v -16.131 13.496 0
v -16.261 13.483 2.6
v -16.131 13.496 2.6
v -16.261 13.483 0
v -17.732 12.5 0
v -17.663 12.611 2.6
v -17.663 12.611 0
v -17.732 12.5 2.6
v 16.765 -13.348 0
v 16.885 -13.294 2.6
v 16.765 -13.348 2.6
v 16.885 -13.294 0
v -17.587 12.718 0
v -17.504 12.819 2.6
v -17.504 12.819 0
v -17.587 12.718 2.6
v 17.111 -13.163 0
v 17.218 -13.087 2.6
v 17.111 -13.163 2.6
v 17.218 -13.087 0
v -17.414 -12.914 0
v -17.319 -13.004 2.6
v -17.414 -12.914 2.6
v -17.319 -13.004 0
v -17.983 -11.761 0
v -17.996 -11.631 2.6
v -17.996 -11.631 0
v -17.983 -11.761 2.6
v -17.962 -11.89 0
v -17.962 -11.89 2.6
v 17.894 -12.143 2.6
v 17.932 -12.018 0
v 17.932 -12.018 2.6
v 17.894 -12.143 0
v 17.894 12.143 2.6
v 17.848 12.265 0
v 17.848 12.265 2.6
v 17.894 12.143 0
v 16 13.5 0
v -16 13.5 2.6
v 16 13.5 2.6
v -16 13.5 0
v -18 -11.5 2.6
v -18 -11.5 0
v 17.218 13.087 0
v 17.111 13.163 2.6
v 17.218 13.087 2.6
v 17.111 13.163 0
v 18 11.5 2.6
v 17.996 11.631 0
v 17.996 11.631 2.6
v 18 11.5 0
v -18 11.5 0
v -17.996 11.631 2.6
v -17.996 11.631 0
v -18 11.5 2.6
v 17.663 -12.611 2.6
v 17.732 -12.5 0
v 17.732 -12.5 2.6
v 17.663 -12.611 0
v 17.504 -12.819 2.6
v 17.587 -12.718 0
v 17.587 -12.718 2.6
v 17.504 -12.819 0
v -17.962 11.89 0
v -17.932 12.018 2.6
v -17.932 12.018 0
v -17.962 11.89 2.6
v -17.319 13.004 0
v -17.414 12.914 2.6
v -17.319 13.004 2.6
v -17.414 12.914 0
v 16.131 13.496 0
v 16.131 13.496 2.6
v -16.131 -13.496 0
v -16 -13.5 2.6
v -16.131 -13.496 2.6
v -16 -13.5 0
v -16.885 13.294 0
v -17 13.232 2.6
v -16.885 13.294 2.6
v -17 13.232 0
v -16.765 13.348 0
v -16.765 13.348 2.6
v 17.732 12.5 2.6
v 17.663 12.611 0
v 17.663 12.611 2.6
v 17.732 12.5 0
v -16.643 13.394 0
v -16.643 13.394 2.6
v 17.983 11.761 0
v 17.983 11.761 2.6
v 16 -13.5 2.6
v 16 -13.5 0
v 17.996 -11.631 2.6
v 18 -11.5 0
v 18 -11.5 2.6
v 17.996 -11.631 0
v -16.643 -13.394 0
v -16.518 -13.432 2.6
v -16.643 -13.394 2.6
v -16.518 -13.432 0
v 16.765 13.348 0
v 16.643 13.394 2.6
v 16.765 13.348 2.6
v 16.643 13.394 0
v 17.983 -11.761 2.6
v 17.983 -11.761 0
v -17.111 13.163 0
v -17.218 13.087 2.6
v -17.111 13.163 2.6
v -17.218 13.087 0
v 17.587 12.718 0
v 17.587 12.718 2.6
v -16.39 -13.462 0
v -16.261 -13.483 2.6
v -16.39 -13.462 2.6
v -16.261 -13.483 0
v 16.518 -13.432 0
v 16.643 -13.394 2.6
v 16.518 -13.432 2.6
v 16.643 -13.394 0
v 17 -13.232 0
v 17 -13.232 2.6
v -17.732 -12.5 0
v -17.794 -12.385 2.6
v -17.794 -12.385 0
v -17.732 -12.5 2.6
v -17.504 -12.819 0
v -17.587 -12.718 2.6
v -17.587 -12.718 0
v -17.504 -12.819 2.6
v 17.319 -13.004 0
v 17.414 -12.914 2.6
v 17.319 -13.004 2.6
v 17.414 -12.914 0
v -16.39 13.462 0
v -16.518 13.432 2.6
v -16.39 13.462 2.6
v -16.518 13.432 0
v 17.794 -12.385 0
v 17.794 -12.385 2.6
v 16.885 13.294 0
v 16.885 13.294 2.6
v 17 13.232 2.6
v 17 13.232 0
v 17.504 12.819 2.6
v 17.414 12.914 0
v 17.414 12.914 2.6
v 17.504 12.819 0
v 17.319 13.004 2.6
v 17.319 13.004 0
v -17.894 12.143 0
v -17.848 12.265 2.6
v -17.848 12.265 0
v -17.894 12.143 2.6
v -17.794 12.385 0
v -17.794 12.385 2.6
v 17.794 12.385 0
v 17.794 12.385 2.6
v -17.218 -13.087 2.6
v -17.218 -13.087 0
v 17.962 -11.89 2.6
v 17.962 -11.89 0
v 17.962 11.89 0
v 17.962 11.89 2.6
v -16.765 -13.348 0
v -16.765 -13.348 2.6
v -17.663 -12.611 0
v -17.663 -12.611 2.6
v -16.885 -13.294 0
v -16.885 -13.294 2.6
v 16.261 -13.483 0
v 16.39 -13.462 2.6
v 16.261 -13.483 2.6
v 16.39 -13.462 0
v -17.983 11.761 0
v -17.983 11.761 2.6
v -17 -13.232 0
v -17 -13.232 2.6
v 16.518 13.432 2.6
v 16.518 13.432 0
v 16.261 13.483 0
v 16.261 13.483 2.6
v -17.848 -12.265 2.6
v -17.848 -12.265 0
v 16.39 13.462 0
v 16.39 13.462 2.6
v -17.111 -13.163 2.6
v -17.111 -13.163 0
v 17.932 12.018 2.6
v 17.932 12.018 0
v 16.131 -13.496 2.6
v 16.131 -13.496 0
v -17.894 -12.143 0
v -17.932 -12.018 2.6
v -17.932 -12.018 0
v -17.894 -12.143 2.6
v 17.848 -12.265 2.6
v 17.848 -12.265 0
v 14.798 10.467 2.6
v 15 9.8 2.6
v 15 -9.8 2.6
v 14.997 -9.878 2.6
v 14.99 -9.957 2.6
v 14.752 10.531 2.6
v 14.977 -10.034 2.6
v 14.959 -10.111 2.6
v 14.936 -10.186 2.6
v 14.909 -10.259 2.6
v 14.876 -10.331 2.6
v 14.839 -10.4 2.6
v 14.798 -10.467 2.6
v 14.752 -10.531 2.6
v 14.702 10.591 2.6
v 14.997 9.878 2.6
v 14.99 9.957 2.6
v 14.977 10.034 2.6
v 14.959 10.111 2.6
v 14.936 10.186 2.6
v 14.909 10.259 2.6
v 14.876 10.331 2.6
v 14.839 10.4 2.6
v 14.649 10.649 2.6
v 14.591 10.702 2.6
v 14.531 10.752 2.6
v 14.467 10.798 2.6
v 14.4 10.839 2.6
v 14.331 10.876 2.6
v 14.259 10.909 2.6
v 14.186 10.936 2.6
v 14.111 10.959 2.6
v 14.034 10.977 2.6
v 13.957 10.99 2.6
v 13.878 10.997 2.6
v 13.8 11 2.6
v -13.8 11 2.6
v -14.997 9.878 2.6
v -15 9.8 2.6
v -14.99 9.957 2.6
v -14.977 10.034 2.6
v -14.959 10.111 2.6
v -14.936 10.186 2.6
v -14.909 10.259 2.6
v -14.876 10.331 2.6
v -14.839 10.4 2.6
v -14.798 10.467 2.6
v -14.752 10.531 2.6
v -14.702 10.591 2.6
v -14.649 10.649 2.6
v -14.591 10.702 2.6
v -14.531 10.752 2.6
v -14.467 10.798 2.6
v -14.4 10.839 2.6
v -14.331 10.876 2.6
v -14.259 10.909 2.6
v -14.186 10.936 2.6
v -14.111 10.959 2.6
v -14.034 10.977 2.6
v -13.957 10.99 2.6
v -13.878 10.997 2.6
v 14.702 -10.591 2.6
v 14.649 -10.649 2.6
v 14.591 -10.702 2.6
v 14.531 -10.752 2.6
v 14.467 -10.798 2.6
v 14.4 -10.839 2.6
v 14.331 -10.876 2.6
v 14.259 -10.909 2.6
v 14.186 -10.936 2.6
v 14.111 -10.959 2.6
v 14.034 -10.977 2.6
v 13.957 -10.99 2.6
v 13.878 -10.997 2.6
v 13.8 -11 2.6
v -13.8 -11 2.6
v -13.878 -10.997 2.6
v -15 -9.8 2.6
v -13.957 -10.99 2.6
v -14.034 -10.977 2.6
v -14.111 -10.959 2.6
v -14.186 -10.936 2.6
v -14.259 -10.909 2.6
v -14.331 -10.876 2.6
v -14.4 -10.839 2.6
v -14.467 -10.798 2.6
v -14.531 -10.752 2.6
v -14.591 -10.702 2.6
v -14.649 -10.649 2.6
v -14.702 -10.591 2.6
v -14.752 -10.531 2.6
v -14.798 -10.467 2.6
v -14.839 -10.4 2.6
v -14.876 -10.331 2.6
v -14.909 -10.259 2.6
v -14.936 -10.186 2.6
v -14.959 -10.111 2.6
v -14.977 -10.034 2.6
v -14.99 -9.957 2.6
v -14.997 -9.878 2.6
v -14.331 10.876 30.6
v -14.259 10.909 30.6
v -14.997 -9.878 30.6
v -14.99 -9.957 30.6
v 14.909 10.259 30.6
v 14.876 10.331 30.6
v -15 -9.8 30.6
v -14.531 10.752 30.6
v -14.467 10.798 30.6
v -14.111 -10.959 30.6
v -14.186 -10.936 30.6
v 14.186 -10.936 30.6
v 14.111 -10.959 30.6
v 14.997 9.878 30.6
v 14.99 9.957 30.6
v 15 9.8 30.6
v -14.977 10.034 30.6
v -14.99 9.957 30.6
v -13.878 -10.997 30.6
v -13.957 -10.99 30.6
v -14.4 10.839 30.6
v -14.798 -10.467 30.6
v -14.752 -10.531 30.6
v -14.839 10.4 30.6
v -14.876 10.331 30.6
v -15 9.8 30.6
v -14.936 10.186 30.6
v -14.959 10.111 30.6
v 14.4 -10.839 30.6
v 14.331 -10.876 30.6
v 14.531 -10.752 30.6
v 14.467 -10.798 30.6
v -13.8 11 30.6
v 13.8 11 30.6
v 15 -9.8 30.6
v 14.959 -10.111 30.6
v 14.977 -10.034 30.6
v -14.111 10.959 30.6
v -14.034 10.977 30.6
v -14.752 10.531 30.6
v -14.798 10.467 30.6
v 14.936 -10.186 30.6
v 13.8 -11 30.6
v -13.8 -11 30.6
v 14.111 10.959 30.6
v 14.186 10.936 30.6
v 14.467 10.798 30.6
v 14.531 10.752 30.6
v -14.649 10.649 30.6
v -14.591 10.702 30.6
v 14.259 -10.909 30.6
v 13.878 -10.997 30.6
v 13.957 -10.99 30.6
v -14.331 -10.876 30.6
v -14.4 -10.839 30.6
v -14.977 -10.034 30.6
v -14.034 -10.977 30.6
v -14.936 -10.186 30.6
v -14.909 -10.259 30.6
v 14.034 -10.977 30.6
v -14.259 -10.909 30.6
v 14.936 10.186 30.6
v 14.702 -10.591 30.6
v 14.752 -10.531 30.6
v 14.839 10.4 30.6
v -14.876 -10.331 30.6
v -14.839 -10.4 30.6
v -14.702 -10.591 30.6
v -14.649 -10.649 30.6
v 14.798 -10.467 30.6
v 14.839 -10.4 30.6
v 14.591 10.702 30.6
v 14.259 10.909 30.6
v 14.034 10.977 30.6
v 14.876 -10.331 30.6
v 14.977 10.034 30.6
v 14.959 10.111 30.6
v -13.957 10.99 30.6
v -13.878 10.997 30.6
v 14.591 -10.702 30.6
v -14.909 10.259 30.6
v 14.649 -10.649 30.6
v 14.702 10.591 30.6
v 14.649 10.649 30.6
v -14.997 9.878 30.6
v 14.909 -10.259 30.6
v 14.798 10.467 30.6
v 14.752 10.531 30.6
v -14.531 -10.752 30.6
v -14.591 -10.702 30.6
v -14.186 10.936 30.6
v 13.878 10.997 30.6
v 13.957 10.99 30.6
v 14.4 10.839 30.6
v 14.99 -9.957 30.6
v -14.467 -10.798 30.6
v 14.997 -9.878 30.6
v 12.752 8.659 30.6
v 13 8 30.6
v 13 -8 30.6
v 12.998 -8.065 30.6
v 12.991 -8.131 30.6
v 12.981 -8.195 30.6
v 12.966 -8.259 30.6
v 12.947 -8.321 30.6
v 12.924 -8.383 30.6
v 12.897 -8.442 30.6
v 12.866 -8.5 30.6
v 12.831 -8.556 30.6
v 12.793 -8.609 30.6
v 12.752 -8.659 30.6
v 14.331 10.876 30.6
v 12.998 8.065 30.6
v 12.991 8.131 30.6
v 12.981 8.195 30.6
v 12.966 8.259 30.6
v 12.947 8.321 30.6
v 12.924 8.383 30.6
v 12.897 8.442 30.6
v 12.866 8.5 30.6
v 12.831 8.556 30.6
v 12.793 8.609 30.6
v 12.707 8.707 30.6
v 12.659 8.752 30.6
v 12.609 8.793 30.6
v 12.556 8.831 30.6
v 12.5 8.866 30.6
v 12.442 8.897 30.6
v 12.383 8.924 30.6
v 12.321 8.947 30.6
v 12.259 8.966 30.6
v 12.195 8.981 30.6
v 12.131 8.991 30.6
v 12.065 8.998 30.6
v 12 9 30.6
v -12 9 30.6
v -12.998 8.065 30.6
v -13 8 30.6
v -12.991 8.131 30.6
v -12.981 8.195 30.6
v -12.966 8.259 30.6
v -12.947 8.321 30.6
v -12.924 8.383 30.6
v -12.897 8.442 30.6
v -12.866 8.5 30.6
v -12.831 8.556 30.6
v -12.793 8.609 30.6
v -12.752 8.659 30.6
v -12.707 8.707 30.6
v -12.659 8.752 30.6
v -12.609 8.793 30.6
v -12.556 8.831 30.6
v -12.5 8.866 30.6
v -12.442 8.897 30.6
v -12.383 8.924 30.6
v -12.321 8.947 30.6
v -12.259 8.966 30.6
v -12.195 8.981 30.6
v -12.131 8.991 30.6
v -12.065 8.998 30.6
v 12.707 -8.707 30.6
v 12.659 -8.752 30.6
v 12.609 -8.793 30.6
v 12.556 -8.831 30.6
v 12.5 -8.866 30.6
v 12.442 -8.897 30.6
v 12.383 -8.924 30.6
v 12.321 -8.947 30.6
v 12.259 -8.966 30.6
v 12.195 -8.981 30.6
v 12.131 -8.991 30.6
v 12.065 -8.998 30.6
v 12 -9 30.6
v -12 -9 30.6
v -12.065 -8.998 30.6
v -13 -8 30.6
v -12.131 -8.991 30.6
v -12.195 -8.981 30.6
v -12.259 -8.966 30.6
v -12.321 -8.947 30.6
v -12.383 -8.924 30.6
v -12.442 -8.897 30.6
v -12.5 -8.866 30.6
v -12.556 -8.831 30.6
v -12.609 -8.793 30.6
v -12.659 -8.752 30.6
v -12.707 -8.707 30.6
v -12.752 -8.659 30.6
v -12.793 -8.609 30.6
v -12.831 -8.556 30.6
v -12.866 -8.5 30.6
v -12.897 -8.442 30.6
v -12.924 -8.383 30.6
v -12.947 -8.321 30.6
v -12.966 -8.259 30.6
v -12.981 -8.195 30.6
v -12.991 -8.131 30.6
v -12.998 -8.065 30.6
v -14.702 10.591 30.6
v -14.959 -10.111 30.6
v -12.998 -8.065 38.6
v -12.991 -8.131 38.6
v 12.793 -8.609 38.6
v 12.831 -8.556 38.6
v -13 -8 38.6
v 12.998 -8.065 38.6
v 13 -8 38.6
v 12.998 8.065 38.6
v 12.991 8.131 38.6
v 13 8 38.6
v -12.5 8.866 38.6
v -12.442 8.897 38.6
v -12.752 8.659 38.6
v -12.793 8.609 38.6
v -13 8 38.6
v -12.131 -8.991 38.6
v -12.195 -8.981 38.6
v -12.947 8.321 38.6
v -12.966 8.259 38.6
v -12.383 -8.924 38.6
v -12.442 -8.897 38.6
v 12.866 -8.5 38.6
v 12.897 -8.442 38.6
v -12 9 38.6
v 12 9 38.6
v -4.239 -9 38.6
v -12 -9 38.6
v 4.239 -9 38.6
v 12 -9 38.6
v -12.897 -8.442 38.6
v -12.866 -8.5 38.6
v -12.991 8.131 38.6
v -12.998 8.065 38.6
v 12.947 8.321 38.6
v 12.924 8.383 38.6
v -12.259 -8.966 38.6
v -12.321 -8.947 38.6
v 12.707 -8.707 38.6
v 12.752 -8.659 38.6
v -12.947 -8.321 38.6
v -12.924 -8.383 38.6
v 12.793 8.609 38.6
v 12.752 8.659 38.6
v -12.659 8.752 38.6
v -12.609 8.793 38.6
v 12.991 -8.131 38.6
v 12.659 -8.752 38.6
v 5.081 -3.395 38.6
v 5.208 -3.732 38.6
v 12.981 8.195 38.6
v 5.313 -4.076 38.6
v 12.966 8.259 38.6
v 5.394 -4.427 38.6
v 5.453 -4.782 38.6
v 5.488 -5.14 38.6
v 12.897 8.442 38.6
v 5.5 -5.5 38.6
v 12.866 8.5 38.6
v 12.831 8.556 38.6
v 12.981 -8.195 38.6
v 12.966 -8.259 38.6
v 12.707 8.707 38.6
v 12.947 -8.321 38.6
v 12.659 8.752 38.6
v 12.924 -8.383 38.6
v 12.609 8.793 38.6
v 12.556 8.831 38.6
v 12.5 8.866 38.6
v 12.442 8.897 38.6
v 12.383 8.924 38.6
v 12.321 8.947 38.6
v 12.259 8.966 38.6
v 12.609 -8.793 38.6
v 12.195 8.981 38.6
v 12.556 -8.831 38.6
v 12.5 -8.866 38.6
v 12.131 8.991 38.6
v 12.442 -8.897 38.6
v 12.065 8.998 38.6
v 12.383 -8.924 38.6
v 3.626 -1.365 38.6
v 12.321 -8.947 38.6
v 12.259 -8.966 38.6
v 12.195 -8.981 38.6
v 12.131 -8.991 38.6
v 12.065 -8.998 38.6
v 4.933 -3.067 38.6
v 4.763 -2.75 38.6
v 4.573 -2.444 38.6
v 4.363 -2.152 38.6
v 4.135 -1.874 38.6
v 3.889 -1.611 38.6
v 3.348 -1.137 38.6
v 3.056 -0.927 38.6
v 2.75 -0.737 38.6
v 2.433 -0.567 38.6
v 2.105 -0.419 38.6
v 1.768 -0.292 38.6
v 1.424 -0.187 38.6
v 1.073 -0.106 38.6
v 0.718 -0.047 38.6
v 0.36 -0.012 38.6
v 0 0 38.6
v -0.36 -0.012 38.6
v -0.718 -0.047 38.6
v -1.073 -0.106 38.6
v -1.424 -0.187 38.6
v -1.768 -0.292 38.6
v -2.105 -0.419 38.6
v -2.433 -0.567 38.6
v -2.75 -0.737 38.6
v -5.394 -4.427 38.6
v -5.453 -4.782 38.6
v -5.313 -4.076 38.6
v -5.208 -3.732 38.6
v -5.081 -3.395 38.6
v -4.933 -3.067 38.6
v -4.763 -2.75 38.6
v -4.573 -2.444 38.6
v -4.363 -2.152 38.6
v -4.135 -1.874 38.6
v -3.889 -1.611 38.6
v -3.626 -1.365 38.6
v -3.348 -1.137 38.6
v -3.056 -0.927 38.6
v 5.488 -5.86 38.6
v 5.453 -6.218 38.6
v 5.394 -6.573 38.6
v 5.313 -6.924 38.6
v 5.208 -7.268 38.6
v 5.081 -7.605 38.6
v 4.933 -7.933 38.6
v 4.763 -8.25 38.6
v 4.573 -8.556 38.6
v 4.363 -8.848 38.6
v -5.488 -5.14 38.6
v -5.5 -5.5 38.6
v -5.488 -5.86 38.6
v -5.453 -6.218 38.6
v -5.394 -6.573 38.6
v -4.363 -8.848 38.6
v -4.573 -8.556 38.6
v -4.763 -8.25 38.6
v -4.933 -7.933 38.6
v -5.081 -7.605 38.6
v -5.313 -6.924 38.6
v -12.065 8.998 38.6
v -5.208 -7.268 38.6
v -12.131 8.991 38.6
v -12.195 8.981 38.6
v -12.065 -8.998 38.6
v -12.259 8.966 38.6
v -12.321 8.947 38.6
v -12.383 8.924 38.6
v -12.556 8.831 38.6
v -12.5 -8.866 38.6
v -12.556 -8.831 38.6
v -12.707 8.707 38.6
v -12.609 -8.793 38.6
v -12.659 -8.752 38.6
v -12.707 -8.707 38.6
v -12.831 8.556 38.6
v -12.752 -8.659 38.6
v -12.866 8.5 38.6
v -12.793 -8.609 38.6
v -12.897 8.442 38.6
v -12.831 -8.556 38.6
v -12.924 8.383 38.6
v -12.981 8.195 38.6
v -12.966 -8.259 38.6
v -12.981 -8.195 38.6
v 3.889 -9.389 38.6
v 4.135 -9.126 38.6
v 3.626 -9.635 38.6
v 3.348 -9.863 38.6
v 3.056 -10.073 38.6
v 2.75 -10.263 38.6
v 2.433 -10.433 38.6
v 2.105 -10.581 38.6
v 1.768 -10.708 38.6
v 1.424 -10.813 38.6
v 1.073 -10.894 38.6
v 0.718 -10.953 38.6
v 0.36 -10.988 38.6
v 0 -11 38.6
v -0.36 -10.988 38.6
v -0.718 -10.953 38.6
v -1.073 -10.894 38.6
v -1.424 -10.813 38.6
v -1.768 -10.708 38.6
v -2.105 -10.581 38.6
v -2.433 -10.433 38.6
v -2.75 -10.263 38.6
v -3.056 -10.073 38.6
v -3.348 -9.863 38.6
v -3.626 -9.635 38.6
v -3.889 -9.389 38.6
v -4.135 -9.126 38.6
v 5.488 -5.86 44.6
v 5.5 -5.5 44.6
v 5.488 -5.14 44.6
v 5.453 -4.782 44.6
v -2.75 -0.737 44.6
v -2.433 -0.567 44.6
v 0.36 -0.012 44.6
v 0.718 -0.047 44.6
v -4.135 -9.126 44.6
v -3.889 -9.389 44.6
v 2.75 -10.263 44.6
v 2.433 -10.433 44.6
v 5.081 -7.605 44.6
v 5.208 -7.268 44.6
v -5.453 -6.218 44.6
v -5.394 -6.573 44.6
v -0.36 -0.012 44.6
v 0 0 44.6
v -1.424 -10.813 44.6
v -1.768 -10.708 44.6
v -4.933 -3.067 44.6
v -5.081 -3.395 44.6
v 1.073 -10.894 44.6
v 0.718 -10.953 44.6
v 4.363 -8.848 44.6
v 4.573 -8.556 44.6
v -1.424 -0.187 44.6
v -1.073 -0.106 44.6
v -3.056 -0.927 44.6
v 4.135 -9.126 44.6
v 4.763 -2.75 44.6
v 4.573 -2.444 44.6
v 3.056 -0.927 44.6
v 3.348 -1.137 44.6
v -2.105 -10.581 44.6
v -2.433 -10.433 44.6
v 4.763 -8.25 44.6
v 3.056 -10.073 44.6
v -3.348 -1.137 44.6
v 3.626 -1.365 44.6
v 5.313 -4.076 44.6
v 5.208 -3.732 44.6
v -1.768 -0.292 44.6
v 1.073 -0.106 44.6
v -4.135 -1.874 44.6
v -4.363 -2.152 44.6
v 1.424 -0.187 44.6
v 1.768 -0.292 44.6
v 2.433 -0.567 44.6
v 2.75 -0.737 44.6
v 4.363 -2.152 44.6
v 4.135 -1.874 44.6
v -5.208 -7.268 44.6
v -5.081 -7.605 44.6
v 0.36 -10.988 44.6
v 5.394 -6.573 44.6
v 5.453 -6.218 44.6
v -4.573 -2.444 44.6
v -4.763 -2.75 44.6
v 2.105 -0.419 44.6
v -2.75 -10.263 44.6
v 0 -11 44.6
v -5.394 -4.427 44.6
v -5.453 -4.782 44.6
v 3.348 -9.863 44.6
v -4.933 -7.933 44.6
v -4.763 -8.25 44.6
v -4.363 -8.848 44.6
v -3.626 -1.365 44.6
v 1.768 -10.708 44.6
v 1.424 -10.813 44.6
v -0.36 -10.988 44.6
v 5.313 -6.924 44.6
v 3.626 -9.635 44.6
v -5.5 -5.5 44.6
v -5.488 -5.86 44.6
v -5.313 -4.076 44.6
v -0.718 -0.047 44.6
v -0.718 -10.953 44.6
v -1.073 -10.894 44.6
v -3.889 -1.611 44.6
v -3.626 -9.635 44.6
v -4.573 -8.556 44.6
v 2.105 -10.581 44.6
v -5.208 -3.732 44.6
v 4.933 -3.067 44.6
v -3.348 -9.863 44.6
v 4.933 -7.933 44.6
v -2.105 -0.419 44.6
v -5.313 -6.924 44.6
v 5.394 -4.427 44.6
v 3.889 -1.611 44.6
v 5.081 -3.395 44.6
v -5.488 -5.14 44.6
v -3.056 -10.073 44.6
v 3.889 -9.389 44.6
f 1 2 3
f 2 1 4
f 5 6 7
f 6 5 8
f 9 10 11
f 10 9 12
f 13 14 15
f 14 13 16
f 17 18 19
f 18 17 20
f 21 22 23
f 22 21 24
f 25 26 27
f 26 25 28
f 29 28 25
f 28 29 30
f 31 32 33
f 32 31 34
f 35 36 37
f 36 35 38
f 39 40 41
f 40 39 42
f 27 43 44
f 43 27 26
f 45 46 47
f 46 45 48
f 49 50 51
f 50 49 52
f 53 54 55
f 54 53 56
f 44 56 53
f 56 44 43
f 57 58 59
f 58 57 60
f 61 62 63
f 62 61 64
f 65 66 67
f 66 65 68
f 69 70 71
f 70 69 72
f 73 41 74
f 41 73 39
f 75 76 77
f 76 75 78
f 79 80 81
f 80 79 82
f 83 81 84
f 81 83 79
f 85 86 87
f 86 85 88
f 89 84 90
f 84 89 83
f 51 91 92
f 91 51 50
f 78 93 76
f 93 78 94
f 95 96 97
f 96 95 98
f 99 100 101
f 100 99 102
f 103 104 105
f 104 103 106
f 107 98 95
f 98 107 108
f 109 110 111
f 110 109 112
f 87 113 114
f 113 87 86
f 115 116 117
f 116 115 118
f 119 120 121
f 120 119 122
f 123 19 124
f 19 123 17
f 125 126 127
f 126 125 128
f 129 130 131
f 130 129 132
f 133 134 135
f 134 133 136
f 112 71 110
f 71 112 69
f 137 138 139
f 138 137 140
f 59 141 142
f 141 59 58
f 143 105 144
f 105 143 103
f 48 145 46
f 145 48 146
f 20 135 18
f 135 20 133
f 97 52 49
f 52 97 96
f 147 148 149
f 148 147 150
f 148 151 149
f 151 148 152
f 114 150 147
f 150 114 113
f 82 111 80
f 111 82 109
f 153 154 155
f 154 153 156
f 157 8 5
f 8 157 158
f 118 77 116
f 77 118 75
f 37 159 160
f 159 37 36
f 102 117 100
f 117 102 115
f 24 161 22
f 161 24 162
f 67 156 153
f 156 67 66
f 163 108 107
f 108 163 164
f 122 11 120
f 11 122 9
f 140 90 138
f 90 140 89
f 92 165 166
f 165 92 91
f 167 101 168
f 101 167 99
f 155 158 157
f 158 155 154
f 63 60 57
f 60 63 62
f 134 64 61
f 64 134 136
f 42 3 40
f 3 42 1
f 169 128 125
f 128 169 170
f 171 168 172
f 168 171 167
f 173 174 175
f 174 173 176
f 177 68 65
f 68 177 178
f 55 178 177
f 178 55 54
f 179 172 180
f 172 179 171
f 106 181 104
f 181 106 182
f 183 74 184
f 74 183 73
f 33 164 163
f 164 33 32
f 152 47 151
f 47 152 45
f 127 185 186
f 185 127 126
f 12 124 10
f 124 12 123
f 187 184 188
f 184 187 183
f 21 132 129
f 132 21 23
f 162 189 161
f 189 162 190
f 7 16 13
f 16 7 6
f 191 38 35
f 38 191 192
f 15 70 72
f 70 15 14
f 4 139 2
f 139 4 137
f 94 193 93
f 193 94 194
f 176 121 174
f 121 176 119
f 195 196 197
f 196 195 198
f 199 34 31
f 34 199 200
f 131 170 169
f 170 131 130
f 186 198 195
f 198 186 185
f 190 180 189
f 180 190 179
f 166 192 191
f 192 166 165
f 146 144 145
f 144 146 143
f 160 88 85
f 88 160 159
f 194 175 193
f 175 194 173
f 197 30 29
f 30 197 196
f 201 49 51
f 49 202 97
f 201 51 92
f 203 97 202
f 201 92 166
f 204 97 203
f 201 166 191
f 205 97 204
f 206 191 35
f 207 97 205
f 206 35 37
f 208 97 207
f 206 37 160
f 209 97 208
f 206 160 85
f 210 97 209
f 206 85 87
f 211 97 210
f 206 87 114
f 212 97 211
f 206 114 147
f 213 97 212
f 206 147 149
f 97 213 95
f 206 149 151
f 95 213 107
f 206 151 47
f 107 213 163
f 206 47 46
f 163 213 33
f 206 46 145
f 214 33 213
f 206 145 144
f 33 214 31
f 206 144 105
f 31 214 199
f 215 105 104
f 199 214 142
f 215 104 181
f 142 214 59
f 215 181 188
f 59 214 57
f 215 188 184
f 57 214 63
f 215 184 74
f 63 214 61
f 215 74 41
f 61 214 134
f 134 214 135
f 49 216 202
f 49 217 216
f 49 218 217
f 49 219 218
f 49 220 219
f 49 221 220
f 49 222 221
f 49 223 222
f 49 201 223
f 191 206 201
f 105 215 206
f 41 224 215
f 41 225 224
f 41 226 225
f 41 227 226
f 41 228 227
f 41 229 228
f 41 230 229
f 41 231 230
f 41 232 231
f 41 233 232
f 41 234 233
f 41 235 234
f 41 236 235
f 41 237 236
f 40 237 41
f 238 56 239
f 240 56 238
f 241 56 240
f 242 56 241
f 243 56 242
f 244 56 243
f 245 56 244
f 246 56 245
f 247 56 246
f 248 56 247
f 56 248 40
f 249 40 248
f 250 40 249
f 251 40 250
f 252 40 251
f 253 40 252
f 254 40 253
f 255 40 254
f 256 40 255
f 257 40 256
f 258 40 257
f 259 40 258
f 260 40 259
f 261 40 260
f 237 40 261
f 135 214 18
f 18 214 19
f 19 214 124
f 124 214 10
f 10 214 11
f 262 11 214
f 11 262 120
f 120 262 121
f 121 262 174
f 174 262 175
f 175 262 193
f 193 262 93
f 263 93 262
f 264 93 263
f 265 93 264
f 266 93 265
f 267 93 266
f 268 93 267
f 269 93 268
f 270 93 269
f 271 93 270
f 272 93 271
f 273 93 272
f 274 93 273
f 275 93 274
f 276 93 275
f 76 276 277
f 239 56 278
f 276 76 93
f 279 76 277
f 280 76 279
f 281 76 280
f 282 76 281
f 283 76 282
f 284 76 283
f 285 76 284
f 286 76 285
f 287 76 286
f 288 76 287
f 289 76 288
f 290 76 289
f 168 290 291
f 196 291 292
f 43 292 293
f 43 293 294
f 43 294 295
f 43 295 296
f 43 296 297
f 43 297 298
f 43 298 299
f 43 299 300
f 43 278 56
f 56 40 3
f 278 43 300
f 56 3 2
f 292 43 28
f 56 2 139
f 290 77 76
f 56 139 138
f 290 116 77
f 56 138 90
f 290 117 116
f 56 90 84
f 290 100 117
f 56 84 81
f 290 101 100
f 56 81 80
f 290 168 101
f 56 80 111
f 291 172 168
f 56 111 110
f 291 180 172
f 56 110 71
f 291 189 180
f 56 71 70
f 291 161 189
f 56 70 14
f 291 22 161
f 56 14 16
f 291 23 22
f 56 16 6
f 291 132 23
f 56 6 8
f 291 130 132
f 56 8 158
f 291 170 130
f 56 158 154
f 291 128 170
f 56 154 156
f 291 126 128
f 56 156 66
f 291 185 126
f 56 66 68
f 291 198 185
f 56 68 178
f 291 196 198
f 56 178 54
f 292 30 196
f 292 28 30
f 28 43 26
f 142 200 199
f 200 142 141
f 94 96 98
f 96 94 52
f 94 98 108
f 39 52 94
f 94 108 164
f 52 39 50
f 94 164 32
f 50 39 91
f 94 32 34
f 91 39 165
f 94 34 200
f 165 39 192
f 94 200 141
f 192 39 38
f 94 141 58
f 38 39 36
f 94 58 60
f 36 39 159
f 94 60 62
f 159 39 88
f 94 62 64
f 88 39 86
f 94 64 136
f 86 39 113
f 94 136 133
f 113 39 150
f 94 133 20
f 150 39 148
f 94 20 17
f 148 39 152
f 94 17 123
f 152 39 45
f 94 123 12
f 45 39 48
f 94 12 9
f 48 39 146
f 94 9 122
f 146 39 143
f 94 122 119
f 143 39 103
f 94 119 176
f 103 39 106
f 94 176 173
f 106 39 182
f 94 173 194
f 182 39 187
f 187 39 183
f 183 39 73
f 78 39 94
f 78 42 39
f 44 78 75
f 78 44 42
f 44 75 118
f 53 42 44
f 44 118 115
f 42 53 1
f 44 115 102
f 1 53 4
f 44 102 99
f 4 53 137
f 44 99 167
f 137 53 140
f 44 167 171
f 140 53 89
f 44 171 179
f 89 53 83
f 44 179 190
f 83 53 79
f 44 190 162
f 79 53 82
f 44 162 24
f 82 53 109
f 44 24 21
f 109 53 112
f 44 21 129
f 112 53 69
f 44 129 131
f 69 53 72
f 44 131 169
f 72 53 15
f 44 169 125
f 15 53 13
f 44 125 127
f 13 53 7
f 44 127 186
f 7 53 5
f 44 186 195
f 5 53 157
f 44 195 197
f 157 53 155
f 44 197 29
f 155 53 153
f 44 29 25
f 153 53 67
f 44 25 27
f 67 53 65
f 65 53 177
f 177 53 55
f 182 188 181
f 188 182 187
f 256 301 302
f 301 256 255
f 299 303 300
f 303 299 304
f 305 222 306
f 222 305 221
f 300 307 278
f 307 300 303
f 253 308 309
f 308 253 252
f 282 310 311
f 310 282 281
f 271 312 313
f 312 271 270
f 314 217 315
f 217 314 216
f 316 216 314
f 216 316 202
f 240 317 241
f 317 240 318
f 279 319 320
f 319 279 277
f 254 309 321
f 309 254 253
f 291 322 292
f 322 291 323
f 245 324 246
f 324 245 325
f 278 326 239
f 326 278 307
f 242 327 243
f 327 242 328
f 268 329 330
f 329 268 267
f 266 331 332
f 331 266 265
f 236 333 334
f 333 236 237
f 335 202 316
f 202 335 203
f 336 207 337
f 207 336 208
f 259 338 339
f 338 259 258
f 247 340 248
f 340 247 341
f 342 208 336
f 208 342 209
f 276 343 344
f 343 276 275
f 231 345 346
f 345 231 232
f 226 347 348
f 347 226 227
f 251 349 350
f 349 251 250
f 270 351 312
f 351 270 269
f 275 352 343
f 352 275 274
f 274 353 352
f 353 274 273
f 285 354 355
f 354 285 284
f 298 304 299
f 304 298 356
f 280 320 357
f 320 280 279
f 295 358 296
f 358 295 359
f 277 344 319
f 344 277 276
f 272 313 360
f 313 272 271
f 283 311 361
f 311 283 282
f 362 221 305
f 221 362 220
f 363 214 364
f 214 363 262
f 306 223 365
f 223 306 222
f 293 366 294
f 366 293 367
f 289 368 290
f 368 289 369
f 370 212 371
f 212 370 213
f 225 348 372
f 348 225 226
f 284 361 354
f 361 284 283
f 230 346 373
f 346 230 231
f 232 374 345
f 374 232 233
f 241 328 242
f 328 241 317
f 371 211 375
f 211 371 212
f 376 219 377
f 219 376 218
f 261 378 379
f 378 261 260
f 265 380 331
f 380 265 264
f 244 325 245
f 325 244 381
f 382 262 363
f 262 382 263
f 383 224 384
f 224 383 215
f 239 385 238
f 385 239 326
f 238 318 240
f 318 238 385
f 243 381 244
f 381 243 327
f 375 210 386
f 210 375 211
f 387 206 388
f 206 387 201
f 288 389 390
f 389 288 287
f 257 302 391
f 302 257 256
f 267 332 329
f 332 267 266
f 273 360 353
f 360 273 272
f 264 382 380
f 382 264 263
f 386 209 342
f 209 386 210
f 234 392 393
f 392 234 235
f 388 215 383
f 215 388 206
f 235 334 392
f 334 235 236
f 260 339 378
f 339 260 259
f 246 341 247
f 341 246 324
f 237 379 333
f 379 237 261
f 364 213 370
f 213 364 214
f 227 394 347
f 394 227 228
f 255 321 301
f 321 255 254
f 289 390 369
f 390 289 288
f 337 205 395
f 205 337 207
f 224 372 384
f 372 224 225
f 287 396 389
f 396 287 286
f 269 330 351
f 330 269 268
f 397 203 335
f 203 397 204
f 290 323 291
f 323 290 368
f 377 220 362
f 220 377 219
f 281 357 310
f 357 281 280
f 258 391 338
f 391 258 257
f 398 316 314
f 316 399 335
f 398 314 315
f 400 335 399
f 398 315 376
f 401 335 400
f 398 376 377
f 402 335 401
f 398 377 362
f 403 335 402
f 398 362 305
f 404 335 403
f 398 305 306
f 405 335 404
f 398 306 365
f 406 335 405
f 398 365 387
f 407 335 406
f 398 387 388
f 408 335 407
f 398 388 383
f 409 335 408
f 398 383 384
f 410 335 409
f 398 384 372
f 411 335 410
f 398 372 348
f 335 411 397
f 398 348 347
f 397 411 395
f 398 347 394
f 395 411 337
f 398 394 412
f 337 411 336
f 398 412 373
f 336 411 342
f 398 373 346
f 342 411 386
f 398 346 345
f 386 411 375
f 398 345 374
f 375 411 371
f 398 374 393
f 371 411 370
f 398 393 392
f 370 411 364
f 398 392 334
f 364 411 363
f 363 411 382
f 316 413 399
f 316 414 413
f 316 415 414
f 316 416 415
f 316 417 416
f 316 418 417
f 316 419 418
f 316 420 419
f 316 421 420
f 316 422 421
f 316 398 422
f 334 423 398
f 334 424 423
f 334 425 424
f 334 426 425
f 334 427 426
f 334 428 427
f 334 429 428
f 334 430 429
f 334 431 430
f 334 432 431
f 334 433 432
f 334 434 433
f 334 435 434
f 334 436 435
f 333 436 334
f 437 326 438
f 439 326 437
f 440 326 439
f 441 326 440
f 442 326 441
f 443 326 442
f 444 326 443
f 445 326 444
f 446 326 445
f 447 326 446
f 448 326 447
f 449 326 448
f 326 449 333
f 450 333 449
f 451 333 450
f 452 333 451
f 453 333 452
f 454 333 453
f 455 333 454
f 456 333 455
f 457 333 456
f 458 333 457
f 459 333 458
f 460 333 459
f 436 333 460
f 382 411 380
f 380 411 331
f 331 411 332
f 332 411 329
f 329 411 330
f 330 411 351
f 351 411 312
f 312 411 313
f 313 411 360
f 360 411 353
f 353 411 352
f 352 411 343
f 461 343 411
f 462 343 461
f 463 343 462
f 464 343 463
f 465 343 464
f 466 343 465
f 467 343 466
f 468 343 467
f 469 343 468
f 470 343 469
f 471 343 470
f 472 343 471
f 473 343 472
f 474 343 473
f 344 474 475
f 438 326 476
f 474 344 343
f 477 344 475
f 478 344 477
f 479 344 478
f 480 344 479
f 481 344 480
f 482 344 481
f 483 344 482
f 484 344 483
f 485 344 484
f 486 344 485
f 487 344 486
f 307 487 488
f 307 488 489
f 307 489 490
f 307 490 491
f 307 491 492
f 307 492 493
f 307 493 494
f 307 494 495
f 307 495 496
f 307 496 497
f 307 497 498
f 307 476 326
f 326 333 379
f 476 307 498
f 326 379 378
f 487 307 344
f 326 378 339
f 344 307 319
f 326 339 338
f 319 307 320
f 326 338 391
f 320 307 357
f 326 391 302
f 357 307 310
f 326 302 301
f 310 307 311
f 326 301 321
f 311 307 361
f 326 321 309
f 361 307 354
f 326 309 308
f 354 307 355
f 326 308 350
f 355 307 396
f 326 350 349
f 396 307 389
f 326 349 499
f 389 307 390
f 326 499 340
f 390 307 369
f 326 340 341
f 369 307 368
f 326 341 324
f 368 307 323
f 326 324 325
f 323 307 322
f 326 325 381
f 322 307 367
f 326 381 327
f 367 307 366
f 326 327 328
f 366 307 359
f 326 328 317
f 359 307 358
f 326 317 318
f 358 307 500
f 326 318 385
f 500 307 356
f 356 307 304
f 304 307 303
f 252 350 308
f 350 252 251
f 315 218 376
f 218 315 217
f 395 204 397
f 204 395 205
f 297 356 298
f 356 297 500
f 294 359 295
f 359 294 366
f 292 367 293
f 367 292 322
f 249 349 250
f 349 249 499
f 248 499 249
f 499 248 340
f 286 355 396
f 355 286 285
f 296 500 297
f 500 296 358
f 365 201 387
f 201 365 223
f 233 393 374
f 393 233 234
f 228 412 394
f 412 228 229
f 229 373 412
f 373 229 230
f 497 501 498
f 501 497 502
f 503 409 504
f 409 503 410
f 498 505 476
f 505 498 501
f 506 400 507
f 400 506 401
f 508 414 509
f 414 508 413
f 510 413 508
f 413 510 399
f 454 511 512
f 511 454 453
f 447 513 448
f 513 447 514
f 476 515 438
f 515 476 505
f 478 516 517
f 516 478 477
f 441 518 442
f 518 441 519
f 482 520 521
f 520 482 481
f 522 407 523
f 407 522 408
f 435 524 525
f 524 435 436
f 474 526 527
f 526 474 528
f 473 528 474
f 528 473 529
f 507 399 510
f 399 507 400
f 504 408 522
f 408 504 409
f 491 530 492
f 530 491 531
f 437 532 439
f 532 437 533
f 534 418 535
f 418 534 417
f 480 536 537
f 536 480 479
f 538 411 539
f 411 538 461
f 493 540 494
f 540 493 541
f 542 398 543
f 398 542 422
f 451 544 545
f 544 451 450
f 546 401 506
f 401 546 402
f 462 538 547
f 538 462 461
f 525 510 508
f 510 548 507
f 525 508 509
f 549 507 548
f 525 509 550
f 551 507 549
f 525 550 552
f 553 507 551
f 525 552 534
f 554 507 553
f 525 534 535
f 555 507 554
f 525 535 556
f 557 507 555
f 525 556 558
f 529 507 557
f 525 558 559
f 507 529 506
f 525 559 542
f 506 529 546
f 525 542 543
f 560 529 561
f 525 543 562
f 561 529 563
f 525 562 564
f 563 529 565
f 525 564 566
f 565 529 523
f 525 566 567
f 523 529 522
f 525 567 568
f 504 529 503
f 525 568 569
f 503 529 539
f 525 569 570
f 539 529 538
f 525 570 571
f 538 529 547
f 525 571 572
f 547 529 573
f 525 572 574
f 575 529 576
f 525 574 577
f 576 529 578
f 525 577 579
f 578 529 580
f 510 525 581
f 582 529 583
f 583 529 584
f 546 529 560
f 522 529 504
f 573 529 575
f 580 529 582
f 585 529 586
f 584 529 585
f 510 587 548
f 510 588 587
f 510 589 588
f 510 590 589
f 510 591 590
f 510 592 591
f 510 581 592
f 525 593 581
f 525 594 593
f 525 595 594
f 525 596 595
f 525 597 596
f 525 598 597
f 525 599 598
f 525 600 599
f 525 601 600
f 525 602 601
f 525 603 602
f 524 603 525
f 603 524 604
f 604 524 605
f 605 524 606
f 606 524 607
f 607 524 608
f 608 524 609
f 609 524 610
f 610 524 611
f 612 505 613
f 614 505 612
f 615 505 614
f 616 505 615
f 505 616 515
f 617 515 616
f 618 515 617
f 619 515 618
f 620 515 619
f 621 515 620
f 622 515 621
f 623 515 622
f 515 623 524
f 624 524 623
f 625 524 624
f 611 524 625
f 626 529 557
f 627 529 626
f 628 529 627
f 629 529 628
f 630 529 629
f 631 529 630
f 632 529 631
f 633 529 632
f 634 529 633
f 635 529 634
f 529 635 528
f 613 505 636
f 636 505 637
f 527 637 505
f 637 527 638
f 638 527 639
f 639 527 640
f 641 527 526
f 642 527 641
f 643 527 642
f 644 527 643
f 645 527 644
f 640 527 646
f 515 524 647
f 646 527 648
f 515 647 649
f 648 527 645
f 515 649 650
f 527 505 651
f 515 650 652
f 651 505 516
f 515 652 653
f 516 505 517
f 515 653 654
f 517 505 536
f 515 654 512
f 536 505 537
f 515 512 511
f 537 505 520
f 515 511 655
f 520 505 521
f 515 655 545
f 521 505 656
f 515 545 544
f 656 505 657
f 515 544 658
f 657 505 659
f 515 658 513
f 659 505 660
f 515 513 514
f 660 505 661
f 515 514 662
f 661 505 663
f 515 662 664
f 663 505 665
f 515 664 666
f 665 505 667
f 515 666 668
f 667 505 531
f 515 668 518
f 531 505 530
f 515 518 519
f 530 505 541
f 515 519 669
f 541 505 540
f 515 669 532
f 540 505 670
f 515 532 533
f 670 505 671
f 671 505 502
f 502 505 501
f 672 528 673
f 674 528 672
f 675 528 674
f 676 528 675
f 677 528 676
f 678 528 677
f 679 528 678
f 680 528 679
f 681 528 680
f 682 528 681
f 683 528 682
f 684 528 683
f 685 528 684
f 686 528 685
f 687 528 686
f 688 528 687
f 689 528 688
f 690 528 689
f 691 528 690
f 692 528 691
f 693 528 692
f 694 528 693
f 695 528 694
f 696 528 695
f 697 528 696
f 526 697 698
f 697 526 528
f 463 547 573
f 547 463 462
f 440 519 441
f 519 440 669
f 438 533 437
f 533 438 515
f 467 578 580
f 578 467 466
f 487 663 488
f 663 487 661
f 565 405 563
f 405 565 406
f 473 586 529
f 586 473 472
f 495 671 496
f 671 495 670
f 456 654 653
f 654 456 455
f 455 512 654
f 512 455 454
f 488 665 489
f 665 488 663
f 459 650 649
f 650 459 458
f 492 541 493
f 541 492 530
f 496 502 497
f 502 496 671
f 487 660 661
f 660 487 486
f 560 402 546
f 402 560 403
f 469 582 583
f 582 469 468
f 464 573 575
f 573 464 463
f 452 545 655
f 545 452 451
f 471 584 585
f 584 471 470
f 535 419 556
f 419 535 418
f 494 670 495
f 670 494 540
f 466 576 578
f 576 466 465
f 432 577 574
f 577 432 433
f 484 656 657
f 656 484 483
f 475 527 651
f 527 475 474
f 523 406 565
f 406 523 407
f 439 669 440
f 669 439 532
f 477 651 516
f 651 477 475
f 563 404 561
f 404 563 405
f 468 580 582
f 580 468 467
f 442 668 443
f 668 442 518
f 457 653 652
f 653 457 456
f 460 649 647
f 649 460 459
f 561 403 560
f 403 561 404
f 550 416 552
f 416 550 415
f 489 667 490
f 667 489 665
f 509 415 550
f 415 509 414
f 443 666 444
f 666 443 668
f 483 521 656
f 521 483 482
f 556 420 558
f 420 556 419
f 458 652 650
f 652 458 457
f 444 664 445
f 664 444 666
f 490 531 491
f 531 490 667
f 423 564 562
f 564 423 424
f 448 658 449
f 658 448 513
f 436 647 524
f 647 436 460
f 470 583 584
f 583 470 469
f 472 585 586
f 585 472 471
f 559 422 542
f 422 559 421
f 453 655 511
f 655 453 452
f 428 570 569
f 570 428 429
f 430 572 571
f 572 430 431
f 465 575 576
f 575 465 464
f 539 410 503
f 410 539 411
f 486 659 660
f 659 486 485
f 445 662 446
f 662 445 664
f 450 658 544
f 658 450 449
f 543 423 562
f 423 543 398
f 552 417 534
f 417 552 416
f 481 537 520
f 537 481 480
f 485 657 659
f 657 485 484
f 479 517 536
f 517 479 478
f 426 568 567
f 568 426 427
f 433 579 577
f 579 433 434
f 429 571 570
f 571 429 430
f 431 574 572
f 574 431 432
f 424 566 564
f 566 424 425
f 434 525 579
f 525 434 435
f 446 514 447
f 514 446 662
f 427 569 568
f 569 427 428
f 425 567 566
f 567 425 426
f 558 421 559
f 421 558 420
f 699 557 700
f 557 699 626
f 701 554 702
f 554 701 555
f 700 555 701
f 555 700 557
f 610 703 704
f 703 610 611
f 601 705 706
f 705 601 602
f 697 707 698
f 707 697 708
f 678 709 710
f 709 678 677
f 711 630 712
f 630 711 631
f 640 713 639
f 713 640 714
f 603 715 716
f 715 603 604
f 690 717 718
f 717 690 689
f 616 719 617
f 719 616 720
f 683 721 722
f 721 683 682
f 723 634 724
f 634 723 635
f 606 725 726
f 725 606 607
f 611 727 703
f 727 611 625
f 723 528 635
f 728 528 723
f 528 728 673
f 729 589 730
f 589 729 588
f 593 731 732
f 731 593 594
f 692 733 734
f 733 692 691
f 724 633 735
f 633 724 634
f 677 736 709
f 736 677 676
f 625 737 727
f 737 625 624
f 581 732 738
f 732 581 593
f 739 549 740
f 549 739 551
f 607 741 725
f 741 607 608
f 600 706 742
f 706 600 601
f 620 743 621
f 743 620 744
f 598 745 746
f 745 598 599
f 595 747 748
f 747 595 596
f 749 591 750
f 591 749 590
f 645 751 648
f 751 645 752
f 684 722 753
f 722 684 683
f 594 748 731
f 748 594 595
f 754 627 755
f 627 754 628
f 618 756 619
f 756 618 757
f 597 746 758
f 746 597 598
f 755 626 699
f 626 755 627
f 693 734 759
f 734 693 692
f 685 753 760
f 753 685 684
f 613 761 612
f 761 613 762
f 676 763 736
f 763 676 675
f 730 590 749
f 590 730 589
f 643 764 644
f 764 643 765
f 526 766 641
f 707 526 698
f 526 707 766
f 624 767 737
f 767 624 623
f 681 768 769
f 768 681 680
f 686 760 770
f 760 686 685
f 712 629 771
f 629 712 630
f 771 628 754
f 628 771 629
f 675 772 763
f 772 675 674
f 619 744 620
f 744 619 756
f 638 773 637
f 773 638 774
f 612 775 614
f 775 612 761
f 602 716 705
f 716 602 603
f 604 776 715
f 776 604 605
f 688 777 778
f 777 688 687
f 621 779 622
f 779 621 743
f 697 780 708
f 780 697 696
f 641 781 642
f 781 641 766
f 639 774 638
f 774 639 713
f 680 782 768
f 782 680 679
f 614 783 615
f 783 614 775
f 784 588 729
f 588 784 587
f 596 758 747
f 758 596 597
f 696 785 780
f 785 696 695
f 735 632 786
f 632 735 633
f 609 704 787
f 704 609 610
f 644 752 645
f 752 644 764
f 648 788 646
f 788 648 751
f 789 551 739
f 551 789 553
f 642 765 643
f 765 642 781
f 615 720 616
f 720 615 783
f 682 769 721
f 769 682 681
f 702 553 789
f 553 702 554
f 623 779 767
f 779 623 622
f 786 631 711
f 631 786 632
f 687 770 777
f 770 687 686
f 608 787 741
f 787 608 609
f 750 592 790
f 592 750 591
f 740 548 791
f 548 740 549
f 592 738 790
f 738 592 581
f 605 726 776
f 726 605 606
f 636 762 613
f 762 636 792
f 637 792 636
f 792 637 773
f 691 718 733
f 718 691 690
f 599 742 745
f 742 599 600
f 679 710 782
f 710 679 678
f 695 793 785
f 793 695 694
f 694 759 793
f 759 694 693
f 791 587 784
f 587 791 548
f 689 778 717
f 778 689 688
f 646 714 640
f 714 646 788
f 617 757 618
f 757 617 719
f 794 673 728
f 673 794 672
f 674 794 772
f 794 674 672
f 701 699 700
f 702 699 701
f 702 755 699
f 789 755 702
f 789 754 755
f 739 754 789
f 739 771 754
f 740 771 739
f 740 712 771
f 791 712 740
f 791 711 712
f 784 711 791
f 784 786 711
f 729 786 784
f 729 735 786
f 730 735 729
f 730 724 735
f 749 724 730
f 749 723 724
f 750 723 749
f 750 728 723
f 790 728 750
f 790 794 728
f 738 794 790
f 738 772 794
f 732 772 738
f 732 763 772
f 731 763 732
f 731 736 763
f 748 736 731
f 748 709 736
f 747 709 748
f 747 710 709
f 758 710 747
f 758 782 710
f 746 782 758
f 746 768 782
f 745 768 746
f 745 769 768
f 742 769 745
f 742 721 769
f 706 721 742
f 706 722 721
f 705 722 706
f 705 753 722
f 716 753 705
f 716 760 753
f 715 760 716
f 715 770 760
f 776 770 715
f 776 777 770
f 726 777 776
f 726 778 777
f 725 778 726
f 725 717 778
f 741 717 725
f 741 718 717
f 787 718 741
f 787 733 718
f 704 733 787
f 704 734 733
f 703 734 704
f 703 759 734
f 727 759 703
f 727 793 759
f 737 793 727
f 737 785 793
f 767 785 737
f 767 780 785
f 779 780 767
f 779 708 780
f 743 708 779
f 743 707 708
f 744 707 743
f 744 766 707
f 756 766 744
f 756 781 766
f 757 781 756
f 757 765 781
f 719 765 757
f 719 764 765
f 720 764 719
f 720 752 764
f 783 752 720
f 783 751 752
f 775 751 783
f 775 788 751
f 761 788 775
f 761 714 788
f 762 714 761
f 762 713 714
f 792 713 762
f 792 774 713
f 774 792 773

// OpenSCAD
$fn=96;

// IEC fused inlet module (JR-101-1F style) - simplified solid model
// Overall faceplate: 36.0 x 27.0 mm
// Includes: front flange, main body, fuse drawer bump, rear terminals block (simplified)

module rounded_rect_2d(w, h, r){
    r2 = min(r, min(w,h)/2);
    hull(){
        translate([ w/2-r2,  h/2-r2]) circle(r=r2);
        translate([-w/2+r2,  h/2-r2]) circle(r=r2);
        translate([-w/2+r2, -h/2+r2]) circle(r=r2);
        translate([ w/2-r2, -h/2+r2]) circle(r=r2);
    }
}

module iec_inlet_jr101_1f(
    face_w=36.0,
    face_h=27.0,
    face_t=2.6,
    face_r=2.0,

    body_w=30.0,
    body_h=22.0,
    body_d=28.0,
    body_r=1.2,

    fuse_w=18.0,
    fuse_h=10.0,
    fuse_d=6.0,
    fuse_offset_y=5.0,

    term_w=26.0,
    term_h=18.0,
    term_d=8.0
){
    // Front faceplate centered at origin, front at z=0, extends to +z
    union(){
        // Faceplate
        linear_extrude(height=face_t)
            rounded_rect_2d(face_w, face_h, face_r);

        // Main body behind faceplate (extends further +z)
        translate([0,0,face_t])
            linear_extrude(height=body_d)
                rounded_rect_2d(body_w, body_h, body_r);

        // Fuse drawer bump on front (slightly protruding)
        translate([0, fuse_offset_y, 0])
            linear_extrude(height=fuse_d)
                rounded_rect_2d(fuse_w, fuse_h, 1.2);

        // Rear terminals block (simplified)
        translate([0,0,face_t+body_d])
            linear_extrude(height=term_d)
                rounded_rect_2d(term_w, term_h, 1.0);

        // Small rear cable strain relief nub (simplified)
        translate([0, -body_h*0.25, face_t+body_d+term_d])
            cylinder(h=6, r=5.5);
    }
}

iec_inlet_jr101_1f();
